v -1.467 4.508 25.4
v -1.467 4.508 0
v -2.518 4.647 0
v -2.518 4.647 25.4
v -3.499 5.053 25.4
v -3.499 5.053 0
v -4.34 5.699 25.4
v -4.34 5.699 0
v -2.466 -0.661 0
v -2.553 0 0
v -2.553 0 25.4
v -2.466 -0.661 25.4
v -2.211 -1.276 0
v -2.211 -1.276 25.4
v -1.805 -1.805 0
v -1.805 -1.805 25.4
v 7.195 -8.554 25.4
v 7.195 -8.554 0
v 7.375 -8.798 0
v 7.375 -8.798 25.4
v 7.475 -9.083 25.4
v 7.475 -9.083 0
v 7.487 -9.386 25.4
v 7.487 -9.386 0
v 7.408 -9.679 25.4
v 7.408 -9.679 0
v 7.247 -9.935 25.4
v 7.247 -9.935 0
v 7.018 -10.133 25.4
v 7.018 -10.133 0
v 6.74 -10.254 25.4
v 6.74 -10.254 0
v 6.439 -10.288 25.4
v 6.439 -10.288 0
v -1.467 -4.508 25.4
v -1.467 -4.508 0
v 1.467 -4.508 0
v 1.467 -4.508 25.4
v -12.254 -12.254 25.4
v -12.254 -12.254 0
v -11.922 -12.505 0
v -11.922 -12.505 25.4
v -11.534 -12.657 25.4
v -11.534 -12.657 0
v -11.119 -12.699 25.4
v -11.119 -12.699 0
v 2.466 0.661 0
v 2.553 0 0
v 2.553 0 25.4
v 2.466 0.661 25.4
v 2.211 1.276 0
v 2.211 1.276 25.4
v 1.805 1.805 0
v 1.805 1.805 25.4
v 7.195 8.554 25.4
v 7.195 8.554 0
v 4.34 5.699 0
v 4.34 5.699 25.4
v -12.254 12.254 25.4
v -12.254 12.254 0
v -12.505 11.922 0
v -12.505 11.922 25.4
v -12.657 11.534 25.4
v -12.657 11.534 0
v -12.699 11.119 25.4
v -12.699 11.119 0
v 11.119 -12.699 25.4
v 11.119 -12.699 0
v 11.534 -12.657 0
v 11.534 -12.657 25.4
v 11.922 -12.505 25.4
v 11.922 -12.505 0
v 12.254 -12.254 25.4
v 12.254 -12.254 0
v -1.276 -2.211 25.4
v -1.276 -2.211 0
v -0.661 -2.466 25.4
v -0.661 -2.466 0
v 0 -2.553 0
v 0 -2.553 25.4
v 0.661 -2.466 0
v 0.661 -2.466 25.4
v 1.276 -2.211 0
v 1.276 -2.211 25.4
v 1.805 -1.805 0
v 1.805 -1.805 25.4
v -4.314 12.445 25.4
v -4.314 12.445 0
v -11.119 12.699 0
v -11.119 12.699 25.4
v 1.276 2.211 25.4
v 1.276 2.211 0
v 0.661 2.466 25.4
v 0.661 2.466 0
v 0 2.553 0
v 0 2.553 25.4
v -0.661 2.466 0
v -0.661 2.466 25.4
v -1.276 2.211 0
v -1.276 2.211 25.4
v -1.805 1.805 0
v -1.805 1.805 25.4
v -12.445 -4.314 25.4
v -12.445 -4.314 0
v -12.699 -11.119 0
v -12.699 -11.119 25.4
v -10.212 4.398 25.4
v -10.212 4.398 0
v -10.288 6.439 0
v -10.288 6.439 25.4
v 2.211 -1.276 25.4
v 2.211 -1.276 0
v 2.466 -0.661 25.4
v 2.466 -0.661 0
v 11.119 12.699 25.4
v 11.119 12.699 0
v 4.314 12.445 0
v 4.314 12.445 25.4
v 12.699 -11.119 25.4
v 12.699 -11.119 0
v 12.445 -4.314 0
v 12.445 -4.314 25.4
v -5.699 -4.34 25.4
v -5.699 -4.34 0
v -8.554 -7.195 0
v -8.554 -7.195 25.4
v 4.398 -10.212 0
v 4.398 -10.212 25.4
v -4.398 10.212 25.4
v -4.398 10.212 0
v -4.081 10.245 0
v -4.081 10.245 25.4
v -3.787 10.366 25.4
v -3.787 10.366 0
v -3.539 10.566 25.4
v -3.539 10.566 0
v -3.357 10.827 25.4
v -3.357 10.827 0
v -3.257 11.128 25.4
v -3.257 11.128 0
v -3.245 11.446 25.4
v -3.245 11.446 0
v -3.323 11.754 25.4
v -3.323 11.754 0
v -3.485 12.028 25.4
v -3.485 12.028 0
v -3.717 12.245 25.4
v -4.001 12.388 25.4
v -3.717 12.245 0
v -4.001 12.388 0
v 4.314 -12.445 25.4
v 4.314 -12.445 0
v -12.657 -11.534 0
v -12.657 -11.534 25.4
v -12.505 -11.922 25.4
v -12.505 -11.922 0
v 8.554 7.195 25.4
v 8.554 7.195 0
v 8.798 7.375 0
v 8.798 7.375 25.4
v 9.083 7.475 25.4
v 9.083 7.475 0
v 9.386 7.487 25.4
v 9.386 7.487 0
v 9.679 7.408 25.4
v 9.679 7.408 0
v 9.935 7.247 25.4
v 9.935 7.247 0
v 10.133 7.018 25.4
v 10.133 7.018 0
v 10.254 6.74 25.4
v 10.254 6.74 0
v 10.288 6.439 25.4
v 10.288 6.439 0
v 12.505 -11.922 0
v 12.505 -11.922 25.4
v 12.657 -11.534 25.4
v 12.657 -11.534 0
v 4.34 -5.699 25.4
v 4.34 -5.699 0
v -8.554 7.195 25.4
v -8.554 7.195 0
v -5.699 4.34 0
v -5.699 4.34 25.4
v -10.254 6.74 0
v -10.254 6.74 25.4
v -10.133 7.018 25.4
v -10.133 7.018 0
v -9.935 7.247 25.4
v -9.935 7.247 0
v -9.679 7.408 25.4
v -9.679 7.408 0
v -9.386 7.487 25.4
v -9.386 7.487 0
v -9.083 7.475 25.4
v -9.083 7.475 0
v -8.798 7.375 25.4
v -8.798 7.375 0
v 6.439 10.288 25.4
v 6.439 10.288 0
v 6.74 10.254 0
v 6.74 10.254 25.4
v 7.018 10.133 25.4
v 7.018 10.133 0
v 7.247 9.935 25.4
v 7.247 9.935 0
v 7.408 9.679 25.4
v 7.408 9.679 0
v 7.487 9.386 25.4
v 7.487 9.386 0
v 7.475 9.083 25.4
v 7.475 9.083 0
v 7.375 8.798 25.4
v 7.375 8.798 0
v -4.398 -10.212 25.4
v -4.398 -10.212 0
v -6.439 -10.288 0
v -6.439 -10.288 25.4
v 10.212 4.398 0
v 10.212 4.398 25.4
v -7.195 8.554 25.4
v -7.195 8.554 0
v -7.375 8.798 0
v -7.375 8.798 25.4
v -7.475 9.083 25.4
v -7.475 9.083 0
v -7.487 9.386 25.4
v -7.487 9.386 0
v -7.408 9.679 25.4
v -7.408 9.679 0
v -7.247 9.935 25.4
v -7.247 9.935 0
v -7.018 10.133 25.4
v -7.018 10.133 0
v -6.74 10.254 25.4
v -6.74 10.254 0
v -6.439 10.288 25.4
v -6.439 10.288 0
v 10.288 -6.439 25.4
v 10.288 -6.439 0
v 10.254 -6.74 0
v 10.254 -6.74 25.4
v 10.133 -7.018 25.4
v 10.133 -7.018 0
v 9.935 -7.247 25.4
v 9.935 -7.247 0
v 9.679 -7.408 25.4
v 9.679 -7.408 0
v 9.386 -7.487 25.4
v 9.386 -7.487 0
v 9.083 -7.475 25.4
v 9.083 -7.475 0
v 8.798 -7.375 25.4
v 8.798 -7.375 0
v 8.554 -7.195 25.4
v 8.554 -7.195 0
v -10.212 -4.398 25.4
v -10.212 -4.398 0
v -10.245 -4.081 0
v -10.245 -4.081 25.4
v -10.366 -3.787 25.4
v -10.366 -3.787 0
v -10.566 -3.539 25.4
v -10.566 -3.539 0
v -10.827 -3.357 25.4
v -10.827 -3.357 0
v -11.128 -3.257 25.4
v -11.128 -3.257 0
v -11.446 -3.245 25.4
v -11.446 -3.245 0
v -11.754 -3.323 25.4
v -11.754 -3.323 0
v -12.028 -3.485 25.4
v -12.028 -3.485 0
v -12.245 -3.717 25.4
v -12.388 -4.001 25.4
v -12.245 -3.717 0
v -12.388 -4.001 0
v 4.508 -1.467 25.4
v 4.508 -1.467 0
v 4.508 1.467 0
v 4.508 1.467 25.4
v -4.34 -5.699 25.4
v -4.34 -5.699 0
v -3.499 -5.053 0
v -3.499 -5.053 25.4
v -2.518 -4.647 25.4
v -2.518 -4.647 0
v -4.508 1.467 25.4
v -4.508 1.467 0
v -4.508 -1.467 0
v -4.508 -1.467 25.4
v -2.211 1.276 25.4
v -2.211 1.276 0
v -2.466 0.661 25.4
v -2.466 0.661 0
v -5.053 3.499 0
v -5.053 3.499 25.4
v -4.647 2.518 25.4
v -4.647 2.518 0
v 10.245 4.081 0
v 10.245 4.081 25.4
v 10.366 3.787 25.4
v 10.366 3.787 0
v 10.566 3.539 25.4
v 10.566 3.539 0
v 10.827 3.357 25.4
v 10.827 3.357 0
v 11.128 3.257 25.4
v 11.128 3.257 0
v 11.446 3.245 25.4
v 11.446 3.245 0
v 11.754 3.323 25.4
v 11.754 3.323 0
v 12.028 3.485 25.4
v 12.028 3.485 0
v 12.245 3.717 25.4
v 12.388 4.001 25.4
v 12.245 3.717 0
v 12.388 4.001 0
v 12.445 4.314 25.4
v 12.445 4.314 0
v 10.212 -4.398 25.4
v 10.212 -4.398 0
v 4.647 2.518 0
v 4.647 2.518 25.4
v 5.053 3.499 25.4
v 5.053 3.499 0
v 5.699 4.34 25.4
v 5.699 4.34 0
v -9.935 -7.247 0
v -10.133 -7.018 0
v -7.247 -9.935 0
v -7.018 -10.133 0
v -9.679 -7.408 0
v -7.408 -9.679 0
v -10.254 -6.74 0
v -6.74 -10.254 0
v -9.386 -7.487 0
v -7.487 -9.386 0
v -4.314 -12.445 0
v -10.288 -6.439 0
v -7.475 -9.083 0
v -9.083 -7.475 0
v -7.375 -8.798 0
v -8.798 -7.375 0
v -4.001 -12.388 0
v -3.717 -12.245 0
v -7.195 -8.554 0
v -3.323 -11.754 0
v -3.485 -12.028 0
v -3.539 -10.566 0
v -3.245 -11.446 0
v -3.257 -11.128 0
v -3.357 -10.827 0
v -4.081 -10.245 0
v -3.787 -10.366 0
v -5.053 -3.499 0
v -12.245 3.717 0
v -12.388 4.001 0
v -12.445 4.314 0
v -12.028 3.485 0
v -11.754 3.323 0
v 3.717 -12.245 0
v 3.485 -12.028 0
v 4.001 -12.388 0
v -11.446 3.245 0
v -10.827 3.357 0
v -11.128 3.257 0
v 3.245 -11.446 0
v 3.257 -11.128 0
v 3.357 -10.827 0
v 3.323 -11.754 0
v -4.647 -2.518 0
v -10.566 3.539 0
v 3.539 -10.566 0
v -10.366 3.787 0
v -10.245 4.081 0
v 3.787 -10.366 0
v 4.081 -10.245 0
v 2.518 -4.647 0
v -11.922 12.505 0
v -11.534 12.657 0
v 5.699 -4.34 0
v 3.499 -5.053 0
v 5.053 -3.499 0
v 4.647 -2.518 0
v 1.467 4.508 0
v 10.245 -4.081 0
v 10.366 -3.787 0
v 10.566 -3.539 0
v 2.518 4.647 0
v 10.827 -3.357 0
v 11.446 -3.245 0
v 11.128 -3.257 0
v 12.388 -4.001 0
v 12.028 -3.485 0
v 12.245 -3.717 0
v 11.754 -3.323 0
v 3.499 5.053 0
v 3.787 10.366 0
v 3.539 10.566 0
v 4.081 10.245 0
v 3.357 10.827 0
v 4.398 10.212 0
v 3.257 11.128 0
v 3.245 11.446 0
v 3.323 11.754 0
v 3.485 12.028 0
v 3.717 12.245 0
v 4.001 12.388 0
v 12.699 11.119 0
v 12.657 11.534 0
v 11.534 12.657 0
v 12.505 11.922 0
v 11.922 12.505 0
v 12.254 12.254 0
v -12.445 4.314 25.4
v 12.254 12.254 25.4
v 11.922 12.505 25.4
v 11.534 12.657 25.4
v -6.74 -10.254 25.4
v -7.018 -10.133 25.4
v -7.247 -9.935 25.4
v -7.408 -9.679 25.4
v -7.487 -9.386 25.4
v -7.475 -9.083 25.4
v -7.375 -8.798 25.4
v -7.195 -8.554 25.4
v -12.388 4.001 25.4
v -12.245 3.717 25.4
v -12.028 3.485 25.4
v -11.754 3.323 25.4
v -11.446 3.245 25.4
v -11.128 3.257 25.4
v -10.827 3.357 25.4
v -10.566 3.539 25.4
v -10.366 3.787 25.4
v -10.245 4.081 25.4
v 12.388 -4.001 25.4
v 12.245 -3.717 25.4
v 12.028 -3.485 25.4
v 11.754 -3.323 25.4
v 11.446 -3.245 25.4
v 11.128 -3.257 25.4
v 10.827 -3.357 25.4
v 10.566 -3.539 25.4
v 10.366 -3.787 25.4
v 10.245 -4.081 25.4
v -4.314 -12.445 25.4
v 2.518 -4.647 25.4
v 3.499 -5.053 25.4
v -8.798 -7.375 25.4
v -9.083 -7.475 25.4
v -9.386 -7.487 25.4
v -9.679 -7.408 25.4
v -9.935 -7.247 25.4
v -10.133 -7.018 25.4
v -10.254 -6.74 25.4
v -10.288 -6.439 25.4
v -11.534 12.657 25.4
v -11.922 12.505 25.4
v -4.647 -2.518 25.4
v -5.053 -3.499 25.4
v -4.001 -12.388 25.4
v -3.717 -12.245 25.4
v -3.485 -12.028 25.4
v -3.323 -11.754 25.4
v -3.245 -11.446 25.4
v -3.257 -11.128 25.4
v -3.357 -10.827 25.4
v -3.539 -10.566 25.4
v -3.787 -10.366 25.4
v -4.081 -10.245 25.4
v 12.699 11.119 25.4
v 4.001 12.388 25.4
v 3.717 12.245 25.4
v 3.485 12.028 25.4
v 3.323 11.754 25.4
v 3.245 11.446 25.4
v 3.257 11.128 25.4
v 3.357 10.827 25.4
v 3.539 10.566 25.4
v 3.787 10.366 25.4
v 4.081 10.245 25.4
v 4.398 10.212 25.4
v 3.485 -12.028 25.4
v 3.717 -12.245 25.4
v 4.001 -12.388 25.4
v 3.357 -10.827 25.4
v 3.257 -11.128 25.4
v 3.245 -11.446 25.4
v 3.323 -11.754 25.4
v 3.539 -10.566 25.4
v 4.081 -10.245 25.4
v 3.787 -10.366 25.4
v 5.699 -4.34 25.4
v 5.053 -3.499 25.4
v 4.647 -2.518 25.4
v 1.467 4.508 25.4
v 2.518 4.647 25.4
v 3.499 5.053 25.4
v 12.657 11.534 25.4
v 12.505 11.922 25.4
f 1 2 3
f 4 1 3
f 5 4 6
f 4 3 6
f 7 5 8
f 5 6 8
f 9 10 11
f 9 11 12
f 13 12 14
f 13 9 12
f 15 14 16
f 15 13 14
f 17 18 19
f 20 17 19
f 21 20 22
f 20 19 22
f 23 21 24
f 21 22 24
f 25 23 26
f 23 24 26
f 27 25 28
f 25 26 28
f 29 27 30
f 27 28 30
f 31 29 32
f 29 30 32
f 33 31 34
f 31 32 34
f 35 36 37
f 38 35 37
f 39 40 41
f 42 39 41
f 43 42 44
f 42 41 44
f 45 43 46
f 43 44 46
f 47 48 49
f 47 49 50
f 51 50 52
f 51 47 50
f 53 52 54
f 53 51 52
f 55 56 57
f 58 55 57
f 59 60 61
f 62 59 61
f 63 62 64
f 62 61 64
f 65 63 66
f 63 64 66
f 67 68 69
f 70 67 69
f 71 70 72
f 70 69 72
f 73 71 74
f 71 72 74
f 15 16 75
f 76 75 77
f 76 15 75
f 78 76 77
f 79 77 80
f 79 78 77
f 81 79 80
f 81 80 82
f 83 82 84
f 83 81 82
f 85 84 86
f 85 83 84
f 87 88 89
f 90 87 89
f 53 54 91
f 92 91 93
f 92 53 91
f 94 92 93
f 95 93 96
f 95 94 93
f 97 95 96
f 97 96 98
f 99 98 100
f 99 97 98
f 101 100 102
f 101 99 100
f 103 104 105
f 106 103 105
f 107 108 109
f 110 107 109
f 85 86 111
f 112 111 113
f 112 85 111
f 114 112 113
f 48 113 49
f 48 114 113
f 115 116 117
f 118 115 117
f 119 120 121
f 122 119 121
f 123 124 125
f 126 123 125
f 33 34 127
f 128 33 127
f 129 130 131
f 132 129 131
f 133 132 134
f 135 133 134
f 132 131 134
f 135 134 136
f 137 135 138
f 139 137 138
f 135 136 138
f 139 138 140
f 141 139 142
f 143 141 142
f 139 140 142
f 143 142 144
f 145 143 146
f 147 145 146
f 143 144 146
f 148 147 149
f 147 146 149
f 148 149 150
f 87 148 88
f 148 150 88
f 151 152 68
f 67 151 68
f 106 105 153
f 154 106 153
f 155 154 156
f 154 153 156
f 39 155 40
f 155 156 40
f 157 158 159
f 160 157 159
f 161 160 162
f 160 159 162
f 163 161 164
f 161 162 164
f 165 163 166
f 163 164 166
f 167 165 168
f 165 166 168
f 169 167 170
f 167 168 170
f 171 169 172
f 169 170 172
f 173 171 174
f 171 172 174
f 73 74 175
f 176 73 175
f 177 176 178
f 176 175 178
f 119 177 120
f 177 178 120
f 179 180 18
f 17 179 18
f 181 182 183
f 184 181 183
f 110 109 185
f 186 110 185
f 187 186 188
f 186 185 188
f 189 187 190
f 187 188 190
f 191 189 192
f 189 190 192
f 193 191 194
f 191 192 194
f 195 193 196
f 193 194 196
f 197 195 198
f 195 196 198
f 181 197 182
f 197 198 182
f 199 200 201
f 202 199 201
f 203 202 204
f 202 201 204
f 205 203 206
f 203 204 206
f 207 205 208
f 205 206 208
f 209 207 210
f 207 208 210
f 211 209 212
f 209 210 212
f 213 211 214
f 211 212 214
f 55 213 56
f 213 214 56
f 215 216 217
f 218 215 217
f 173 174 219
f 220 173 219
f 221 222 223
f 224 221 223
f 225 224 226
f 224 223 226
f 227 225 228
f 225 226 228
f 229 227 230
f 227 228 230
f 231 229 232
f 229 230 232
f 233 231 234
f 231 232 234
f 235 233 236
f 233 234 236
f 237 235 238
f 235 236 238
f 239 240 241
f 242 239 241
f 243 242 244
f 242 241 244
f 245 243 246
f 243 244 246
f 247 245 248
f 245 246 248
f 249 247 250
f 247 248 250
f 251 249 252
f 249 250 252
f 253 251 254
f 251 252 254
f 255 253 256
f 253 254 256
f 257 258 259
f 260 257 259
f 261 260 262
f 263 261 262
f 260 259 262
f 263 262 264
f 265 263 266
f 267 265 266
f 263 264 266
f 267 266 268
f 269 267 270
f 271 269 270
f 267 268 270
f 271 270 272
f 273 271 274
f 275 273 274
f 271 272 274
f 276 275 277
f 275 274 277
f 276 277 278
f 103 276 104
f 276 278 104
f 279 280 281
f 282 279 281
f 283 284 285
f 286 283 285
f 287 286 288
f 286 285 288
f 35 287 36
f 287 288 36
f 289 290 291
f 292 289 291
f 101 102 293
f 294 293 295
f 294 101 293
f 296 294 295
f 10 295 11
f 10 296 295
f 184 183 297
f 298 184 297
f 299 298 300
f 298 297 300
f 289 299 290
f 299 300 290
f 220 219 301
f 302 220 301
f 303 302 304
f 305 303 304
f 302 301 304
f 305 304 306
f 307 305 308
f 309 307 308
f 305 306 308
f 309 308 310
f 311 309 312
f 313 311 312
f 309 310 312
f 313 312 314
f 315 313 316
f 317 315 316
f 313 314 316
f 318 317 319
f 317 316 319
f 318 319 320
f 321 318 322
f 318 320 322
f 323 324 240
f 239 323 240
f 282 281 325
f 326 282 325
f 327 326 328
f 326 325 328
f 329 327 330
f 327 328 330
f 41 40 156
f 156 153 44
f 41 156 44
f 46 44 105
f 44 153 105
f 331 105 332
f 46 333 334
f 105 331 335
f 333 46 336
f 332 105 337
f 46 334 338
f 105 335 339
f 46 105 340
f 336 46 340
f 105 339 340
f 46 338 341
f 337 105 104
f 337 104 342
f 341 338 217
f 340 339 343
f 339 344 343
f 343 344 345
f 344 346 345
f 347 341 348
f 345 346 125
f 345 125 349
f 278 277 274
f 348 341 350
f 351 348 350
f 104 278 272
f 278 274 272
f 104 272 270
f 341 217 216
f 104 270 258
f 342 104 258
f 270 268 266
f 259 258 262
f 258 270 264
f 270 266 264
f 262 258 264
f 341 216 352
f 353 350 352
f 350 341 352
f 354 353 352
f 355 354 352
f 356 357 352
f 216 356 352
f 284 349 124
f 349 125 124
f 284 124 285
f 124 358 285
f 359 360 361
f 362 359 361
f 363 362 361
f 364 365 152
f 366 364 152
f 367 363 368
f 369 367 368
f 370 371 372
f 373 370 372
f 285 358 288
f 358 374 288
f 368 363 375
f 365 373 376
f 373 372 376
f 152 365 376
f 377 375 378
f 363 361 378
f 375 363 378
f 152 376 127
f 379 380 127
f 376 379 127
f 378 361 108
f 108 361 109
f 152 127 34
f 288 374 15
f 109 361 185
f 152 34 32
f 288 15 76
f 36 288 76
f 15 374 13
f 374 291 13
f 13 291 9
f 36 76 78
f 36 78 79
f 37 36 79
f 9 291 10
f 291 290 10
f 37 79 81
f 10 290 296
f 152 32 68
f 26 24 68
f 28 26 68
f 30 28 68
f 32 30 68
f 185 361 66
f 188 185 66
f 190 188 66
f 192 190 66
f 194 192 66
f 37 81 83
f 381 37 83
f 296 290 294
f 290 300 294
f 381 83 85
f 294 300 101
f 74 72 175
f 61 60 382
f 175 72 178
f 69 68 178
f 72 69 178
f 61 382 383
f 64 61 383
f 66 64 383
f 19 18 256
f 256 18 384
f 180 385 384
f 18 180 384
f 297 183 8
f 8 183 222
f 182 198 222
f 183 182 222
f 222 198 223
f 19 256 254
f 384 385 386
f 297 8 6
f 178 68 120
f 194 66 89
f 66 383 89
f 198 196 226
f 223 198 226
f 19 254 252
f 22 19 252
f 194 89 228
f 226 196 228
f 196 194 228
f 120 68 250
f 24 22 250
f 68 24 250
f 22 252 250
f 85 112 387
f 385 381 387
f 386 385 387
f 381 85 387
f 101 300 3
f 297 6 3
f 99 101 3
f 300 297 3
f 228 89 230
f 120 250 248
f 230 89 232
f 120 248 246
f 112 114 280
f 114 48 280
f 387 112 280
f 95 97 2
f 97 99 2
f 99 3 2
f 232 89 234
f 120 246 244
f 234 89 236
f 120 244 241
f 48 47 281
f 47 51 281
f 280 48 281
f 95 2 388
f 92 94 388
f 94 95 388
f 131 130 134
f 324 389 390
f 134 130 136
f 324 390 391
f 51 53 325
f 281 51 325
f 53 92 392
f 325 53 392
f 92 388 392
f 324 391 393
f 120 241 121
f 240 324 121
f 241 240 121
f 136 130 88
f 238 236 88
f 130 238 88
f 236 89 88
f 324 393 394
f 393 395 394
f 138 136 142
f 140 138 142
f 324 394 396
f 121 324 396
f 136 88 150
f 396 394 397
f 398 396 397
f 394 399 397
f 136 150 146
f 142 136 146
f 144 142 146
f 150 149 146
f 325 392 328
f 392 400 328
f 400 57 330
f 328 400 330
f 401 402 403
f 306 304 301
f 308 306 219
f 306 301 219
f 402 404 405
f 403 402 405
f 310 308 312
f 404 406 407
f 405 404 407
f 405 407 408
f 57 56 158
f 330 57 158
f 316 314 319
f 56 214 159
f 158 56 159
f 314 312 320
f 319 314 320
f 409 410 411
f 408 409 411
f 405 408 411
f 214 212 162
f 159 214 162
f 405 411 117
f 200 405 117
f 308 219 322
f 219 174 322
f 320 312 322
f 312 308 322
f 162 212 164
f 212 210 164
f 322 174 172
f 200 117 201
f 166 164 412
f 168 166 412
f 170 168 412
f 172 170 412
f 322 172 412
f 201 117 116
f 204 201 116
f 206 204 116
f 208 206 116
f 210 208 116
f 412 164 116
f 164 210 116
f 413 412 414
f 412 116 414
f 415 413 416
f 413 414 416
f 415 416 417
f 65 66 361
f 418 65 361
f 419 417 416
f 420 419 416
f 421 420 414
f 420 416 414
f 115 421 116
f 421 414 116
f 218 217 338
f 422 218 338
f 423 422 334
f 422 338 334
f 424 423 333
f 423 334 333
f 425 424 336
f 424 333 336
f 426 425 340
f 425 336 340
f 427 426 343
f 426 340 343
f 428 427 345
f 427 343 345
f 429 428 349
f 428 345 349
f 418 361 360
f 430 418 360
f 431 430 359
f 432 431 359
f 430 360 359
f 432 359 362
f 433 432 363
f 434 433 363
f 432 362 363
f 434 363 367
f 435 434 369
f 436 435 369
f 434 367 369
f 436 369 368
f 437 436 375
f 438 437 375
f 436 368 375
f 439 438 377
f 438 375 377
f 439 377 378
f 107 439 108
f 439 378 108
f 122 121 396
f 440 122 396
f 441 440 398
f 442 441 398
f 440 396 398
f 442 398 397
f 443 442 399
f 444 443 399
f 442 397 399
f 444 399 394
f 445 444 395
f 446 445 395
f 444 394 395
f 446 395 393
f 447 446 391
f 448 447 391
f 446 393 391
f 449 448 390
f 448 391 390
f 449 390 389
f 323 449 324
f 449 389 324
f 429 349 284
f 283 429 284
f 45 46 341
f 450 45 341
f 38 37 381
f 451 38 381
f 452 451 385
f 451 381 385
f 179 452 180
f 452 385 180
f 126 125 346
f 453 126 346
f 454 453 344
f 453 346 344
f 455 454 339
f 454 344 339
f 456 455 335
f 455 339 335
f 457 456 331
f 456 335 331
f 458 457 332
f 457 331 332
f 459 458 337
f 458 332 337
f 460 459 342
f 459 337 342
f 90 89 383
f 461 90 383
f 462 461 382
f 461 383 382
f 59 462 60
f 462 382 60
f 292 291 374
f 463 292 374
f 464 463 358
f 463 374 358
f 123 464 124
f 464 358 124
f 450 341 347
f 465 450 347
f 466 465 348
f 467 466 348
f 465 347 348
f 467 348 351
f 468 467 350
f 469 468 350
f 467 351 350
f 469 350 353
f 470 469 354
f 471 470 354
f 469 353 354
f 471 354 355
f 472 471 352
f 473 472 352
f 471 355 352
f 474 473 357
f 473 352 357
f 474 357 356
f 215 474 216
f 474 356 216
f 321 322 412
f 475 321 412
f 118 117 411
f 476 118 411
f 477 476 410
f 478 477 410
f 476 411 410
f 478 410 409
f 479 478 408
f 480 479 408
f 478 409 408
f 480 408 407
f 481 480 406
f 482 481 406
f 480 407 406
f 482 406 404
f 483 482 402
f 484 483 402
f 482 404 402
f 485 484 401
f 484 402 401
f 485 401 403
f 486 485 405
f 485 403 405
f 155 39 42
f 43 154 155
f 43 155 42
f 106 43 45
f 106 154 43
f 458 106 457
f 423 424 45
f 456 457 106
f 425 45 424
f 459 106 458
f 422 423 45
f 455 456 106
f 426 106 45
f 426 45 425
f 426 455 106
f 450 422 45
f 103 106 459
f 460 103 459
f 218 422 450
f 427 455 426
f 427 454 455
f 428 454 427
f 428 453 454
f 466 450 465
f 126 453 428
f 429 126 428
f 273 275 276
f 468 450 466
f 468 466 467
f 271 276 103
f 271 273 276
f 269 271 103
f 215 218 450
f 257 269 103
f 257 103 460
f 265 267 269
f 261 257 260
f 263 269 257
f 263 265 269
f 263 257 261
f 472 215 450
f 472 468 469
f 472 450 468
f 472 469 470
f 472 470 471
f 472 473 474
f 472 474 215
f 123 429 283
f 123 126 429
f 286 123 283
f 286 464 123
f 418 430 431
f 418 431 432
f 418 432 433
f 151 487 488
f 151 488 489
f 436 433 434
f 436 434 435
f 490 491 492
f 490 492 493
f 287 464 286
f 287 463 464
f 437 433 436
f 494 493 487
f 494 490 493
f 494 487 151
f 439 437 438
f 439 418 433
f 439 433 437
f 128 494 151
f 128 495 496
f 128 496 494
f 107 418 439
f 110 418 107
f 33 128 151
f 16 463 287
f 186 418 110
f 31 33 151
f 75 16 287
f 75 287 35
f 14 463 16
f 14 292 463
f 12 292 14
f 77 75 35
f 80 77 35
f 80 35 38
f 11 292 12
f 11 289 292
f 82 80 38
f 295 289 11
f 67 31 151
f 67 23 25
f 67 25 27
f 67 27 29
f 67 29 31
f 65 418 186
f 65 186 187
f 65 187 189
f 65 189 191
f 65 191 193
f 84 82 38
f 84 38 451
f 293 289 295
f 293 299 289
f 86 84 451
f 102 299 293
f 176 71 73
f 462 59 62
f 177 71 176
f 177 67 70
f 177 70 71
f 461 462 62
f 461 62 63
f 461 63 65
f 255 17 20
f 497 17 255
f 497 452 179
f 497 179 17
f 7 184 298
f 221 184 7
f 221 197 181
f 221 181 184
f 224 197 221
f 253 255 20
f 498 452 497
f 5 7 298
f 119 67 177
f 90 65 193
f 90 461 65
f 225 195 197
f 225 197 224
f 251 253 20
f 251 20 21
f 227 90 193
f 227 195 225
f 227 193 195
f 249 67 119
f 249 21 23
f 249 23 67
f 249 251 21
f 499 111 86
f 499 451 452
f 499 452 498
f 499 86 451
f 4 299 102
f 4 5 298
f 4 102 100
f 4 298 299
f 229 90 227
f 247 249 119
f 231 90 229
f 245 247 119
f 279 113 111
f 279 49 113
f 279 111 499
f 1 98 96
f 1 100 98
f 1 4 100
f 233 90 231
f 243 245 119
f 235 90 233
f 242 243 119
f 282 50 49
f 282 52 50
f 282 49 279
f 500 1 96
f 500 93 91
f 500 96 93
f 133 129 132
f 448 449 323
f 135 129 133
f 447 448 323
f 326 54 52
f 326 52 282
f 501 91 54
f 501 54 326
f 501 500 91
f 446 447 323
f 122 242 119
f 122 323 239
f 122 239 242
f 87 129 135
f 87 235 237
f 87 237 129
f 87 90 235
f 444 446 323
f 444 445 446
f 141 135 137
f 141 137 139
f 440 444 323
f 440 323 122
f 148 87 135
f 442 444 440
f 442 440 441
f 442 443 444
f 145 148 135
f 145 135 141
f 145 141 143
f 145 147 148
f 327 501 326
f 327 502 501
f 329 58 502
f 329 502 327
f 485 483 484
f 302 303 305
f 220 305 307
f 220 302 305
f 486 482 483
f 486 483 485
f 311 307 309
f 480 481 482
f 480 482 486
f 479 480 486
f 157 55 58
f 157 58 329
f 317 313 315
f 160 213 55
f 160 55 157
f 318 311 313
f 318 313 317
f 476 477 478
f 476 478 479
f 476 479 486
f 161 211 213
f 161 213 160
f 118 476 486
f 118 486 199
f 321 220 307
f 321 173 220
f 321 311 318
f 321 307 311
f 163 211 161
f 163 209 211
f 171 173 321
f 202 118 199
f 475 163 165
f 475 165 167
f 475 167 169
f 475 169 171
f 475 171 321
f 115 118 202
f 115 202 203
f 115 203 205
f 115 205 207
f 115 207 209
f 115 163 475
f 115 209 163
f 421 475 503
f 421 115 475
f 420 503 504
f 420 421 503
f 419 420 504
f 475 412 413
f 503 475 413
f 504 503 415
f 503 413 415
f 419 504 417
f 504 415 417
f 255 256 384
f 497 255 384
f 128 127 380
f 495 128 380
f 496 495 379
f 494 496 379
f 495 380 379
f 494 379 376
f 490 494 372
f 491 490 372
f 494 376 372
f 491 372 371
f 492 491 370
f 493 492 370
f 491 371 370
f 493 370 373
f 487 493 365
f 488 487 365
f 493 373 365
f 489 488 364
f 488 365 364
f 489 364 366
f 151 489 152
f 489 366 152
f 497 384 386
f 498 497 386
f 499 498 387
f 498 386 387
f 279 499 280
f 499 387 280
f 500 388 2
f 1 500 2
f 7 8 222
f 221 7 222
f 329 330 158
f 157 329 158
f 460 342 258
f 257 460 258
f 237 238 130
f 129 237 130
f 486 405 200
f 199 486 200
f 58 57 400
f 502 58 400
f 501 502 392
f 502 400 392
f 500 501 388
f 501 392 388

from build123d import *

# Parameters (mm, degrees)
EXTRUDE1_DEPTH = 25.4


with BuildPart() as part:
    # Sketch1 → Extrude1 (new body)
    with BuildSketch(Plane.XY):
        with BuildLine():
            Line((11.119216576, 12.698941773), (4.314458822, 12.445223967))
            ThreePointArc((4.314458822, 12.445223967), (3.239276033, 11.286758822), (4.397741178, 10.211576033))
            Line((4.397741178, 10.211576033), (6.439144384, 10.287690476))
            ThreePointArc((6.439144384, 10.287690476), (7.408254029, 9.678624879), (7.19542049, 8.553975471))
            Line((7.19542049, 8.553975471), (4.34026306, 5.698818041))
            ThreePointArc((4.34026306, 5.698818041), (3.02180657, 4.81785358), (1.466581101, 4.5085))
            Line((1.466581101, 4.5085), (0, 4.5085))
            Line((0, 4.5085), (-1.466581101, 4.5085))
            ThreePointArc((-1.466581101, 4.5085), (-3.02180657, 4.81785358), (-4.34026306, 5.698818041))
            Line((-4.34026306, 5.698818041), (-7.19542049, 8.553975471))
            ThreePointArc((-7.19542049, 8.553975471), (-7.408254029, 9.678624879), (-6.439144384, 10.287690476))
            Line((-6.439144384, 10.287690476), (-4.397741178, 10.211576033))
            ThreePointArc((-4.397741178, 10.211576033), (-3.239276033, 11.286758822), (-4.314458822, 12.445223967))
            Line((-4.314458822, 12.445223967), (-11.119216576, 12.698941773))
            ThreePointArc((-11.119216576, 12.698941773), (-11.732873224, 12.594614892), (-12.253630735, 12.253630735))
            ThreePointArc((-12.253630735, 12.253630735), (-12.594614892, 11.732873224), (-12.698941773, 11.119216576))
            Line((-12.698941773, 11.119216576), (-12.445223967, 4.314458822))
            ThreePointArc((-12.445223967, 4.314458822), (-11.286758822, 3.239276033), (-10.211576033, 4.397741178))
            Line((-10.211576033, 4.397741178), (-10.287690476, 6.439144384))
            ThreePointArc((-10.287690476, 6.439144384), (-9.678624879, 7.408254029), (-8.553975471, 7.19542049))
            Line((-8.553975471, 7.19542049), (-5.698818041, 4.34026306))
            ThreePointArc((-5.698818041, 4.34026306), (-4.81785358, 3.02180657), (-4.5085, 1.466581101))
            Line((-4.5085, 1.466581101), (-4.5085, 0))
            Line((-4.5085, 0), (-4.5085, -1.466581101))
            ThreePointArc((-4.5085, -1.466581101), (-4.81785358, -3.02180657), (-5.698818041, -4.34026306))
            Line((-5.698818041, -4.34026306), (-8.553975471, -7.19542049))
            ThreePointArc((-8.553975471, -7.19542049), (-9.678624879, -7.408254029), (-10.287690476, -6.439144384))
            Line((-10.287690476, -6.439144384), (-10.211576033, -4.397741178))
            ThreePointArc((-10.211576033, -4.397741178), (-11.286758822, -3.239276033), (-12.445223967, -4.314458822))
            Line((-12.445223967, -4.314458822), (-12.698941773, -11.119216576))
            ThreePointArc((-12.698941773, -11.119216576), (-12.594614892, -11.732873224), (-12.253630735, -12.253630735))
            ThreePointArc((-12.253630735, -12.253630735), (-11.732873224, -12.594614892), (-11.119216576, -12.698941773))
            Line((-11.119216576, -12.698941773), (-4.314458822, -12.445223967))
            ThreePointArc((-4.314458822, -12.445223967), (-3.239276033, -11.286758822), (-4.397741178, -10.211576033))
            Line((-4.397741178, -10.211576033), (-6.439144384, -10.287690476))
            ThreePointArc((-6.439144384, -10.287690476), (-7.408254029, -9.678624879), (-7.19542049, -8.553975471))
            Line((-7.19542049, -8.553975471), (-4.34026306, -5.698818041))
            ThreePointArc((-4.34026306, -5.698818041), (-3.02180657, -4.81785358), (-1.466581101, -4.5085))
            Line((-1.466581101, -4.5085), (0, -4.5085))
            Line((0, -4.5085), (1.466581101, -4.5085))
            ThreePointArc((1.466581101, -4.5085), (3.02180657, -4.81785358), (4.34026306, -5.698818041))
            Line((4.34026306, -5.698818041), (7.19542049, -8.553975471))
            ThreePointArc((7.19542049, -8.553975471), (7.408254029, -9.678624879), (6.439144384, -10.287690476))
            Line((6.439144384, -10.287690476), (4.397741178, -10.211576033))
            ThreePointArc((4.397741178, -10.211576033), (3.239276033, -11.286758822), (4.314458822, -12.445223967))
            Line((4.314458822, -12.445223967), (11.119216576, -12.698941773))
            ThreePointArc((11.119216576, -12.698941773), (11.732873224, -12.594614892), (12.253630735, -12.253630735))
            ThreePointArc((12.253630735, -12.253630735), (12.594614892, -11.732873224), (12.698941773, -11.119216576))
            Line((12.698941773, -11.119216576), (12.445223967, -4.314458822))
            ThreePointArc((12.445223967, -4.314458822), (11.286758822, -3.239276033), (10.211576033, -4.397741178))
            Line((10.211576033, -4.397741178), (10.287690476, -6.439144384))
            ThreePointArc((10.287690476, -6.439144384), (9.678624879, -7.408254029), (8.553975471, -7.19542049))
            Line((8.553975471, -7.19542049), (5.698818041, -4.34026306))
            ThreePointArc((5.698818041, -4.34026306), (4.81785358, -3.02180657), (4.5085, -1.466581101))
            Line((4.5085, -1.466581101), (4.5085, 0))
            Line((4.5085, 0), (4.5085, 1.466581101))
            ThreePointArc((4.5085, 1.466581101), (4.81785358, 3.02180657), (5.698818041, 4.34026306))
            Line((5.698818041, 4.34026306), (8.553975471, 7.19542049))
            ThreePointArc((8.553975471, 7.19542049), (9.678624879, 7.408254029), (10.287690476, 6.439144384))
            Line((10.287690476, 6.439144384), (10.211576033, 4.397741178))
            ThreePointArc((10.211576033, 4.397741178), (11.286758822, 3.239276033), (12.445223967, 4.314458822))
            Line((12.445223967, 4.314458822), (12.698941773, 11.119216576))
            ThreePointArc((12.698941773, 11.119216576), (12.594614892, 11.732873224), (12.253630735, 12.253630735))
            ThreePointArc((12.253630735, 12.253630735), (11.732873224, 12.594614892), (11.119216576, 12.698941773))
        make_face()
        with BuildLine():
            ThreePointArc((1.80503148, 1.80503148), (0.976875998, 2.358387283), (0, 2.5527))
            ThreePointArc((0, 2.5527), (-0.976875998, 2.358387283), (-1.80503148, 1.80503148))
            ThreePointArc((-1.80503148, 1.80503148), (-2.358387283, 0.976875998), (-2.5527, 0))
            ThreePointArc((-2.5527, 0), (-2.358387283, -0.976875998), (-1.80503148, -1.80503148))
            ThreePointArc((-1.80503148, -1.80503148), (-0.976875998, -2.358387283), (0, -2.5527))
            ThreePointArc((0, -2.5527), (0.976875998, -2.358387283), (1.80503148, -1.80503148))
            ThreePointArc((1.80503148, -1.80503148), (2.358387283, -0.976875998), (2.5527, 0))
            ThreePointArc((2.5527, 0), (2.358387283, 0.976875998), (1.80503148, 1.80503148))
        make_face(mode=Mode.SUBTRACT)
    extrude(amount=EXTRUDE1_DEPTH)


solid = part.part
